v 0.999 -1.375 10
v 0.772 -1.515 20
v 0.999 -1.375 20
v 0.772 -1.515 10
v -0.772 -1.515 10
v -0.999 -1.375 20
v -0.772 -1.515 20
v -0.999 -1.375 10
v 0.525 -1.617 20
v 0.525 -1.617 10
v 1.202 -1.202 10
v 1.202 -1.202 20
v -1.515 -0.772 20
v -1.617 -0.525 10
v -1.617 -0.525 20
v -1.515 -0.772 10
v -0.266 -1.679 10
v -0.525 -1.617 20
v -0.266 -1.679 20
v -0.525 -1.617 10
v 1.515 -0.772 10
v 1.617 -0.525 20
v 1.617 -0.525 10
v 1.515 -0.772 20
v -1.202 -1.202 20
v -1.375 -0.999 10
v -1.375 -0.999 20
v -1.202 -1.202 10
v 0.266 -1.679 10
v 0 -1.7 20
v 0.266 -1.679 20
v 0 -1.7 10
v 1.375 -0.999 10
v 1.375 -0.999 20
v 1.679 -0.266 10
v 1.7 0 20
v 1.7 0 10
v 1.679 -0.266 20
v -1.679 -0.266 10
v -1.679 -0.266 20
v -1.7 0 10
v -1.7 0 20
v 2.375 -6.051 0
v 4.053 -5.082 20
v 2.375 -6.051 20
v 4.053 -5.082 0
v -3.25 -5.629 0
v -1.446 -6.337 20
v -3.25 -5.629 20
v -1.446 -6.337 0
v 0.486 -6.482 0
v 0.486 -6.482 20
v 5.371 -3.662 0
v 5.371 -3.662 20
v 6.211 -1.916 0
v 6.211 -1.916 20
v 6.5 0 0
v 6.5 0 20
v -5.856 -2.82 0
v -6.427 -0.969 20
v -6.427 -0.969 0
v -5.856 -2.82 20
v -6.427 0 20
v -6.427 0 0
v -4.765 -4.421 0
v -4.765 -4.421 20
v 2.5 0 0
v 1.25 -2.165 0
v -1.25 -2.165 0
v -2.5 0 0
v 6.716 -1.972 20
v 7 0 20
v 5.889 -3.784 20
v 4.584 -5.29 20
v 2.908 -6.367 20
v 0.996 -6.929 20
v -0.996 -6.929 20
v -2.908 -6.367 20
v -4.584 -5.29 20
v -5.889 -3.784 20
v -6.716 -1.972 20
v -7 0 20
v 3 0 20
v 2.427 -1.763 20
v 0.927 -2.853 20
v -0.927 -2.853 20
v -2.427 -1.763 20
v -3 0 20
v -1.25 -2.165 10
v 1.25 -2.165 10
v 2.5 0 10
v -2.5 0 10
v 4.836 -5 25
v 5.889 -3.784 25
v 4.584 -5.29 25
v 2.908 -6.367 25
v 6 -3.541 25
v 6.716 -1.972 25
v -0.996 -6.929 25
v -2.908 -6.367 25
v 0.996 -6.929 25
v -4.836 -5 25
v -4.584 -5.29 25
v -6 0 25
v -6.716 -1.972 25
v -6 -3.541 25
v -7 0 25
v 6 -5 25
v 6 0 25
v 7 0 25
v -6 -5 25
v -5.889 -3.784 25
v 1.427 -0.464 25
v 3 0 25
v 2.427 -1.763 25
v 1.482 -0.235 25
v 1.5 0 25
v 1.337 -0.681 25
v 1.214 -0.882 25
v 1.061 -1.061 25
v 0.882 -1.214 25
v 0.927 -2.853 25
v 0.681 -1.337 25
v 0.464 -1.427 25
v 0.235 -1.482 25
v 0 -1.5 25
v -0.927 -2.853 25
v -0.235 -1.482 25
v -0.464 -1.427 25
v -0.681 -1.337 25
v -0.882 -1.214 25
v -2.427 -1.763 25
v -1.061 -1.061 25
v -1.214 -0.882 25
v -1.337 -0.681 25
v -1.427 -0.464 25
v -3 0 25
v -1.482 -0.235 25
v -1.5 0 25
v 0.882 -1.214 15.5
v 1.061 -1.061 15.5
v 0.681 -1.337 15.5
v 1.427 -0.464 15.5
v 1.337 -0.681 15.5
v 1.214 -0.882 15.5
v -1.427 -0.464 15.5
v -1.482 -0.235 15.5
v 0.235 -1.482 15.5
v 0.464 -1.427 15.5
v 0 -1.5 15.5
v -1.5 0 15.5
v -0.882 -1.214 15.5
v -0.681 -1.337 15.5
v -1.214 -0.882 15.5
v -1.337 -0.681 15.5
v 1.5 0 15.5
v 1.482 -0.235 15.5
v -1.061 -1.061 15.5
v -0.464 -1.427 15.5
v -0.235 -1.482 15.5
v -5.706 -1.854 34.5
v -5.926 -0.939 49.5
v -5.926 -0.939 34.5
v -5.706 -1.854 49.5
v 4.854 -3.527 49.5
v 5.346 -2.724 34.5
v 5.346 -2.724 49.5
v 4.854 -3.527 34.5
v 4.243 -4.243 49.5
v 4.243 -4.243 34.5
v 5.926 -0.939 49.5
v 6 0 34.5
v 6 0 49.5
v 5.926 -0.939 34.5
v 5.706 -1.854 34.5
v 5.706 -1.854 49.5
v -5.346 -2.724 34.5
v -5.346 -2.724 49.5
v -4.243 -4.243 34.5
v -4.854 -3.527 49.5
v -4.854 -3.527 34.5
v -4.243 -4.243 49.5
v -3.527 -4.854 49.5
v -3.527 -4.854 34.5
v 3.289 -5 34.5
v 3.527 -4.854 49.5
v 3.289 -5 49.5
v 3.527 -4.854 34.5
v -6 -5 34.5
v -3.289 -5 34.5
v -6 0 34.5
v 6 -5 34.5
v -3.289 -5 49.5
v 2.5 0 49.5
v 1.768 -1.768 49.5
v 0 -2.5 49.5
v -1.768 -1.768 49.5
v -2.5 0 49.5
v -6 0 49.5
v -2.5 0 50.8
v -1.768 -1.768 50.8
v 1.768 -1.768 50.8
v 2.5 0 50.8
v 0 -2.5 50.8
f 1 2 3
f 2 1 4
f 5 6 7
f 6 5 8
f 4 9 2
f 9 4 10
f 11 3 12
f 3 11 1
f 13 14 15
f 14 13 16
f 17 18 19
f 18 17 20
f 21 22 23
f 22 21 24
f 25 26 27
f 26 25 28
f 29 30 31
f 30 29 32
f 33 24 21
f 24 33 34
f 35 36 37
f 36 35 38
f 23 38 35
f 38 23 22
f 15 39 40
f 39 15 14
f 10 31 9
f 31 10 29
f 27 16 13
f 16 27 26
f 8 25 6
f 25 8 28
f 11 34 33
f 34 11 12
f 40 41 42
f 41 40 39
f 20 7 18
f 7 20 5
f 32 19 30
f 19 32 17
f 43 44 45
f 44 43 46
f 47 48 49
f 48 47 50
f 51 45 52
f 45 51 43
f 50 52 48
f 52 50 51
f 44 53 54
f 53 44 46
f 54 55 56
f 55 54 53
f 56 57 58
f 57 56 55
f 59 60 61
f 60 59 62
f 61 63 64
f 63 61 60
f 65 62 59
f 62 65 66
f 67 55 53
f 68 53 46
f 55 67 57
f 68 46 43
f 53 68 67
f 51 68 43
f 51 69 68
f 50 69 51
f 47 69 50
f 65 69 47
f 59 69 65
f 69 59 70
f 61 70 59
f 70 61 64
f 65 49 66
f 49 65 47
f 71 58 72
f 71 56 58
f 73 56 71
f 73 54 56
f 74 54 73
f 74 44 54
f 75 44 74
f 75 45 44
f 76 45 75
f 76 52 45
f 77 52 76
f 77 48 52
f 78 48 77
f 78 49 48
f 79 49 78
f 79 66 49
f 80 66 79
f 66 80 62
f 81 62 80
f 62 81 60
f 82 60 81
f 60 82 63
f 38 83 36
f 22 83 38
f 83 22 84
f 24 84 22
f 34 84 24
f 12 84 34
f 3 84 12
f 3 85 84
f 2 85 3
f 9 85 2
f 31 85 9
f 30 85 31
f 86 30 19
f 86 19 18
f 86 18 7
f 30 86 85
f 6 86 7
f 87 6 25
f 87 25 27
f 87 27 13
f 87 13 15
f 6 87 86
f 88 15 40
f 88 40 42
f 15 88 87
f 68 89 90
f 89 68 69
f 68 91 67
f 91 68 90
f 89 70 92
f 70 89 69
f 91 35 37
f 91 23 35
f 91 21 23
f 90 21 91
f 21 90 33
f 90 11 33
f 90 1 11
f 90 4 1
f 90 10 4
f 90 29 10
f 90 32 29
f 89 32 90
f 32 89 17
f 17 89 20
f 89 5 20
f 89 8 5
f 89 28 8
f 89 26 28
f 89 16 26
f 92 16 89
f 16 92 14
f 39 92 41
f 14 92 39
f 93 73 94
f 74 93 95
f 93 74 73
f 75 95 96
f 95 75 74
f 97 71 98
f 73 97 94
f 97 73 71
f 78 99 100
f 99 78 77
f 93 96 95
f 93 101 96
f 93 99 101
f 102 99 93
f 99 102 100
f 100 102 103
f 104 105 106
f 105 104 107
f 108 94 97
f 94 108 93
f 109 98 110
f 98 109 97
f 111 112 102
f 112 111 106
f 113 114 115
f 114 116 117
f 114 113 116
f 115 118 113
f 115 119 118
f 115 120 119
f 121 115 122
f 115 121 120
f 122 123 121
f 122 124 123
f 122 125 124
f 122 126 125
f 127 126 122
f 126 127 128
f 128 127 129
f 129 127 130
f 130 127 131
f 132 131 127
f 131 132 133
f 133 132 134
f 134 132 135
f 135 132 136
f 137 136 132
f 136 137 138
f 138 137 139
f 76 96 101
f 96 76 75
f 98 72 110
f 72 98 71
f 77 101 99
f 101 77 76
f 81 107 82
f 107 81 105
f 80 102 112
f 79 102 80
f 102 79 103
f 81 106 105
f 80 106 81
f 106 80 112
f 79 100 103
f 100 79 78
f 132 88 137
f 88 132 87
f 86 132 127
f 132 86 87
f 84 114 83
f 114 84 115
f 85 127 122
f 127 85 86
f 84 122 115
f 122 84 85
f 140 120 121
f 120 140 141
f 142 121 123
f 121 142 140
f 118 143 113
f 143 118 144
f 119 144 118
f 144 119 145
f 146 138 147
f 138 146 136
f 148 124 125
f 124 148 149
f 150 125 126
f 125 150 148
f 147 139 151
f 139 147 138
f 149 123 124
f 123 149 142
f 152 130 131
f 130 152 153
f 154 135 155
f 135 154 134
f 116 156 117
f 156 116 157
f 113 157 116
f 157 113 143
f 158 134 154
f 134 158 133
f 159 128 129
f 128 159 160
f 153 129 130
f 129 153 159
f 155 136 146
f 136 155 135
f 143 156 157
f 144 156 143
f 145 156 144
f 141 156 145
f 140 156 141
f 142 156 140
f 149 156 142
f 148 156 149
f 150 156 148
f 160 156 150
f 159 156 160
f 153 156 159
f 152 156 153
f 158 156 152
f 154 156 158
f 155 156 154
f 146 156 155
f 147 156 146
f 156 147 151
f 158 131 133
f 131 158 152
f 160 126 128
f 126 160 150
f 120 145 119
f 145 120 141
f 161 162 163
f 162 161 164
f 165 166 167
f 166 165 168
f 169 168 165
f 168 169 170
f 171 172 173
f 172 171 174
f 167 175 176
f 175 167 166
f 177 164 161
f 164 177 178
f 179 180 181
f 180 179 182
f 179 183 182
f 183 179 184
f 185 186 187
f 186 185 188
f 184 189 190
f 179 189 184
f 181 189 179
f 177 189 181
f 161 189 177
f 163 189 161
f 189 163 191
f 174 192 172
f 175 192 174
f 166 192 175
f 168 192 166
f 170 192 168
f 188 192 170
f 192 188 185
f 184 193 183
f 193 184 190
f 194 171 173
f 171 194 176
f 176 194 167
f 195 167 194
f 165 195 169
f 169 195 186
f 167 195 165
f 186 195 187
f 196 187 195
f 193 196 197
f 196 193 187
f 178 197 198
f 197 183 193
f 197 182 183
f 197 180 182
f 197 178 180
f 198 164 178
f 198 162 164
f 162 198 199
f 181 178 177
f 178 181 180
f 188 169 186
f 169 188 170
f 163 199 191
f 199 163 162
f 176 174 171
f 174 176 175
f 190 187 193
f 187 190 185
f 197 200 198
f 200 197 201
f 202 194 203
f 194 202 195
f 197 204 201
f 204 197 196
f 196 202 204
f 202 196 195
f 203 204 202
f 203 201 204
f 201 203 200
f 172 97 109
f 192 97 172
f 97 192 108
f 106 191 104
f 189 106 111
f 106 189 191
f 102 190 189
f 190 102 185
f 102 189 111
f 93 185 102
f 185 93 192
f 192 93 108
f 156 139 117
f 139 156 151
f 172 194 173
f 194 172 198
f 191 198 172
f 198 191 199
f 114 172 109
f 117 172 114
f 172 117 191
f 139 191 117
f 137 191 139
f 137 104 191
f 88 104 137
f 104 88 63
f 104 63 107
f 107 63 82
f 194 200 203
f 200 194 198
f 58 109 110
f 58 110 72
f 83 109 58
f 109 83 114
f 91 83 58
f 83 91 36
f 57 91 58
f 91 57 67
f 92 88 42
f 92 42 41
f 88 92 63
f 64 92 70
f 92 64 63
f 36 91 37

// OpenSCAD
couplingR = 13/2;
couplingHexLength = 10;
couplingHexR=5/2+0.25*0;

couplingdLength = 10;
couplingDR = 3/2+0.20;
couplingDRD = 2.5/2+0.15;
couplingL = couplingHexLength+couplingdLength;

bearingIR = 6/2;
bearingOR = 14/2;
bearingH = 5;

motorFlatR = 10/2;
motorR = 12/2;
motorBR = 5/2;
motorBRL = 1.3;
motorL = 15;
gearBoxL = 9.5;

shaftL = 9.5;
shaftR1 = 3/2;
shaftR2 = 2.5/2;

module coupling(){
    color([0,1,0])
    difference(){
        cylinder(couplingL,couplingR, couplingR);
        translate([0,0,-1])cylinder(couplingHexLength+1, couplingHexR,couplingHexR,$fn=6);
        translate([0,0,couplingHexLength-1]) dCylinder(couplingdLength+2, couplingDR,couplingDRD);;
    }
}

module dCylinder(l,r1,r2){
    difference(){
        cylinder(l,r1,r1, $fn = 40);
        translate([-r1,r1-(2*r1-2*r2),-1]) cube([2*r1, 2*r1, l+2]);
    }
}

module doubleFlatCylinder(l,r1,r2){
    difference(){
        cylinder(l,r1,r1, $fn = 40);
        translate([-r1,r2,-1]) cube([2*r1, 2*r1, l+2]);
        translate([-r1,-r2-2*r1,-1]) cube([2*r1, 2*r1, l+2]);
    }
}

module bearing(){
    color([0,0,1])
    difference(){
        cylinder(bearingH, bearingOR, bearingOR);
        translate([0,0,-1])
        cylinder(bearingH+2, bearingIR, bearingIR);
    }
}

module motor(){
    dCylinder(shaftL, shaftR1, shaftR2);
    translate([0,0,shaftL+gearBoxL]){
        doubleFlatCylinder(motorL, motorR, motorFlatR);
        translate([0,0,motorL]) cylinder(motorBRL, motorBR, motorBR); 
    }
    translate([-motorR, -motorFlatR,shaftL]) cube([2*motorR, 2*motorFlatR, gearBoxL]);
}

module assembly(){
    coupling();
        translate([0,0,couplingL]){
            bearing();
            translate([0,0,bearingH-shaftL]) motor();
    }
}
difference(){
assembly();
    translate([-50,0,-1])cube(100);
}
